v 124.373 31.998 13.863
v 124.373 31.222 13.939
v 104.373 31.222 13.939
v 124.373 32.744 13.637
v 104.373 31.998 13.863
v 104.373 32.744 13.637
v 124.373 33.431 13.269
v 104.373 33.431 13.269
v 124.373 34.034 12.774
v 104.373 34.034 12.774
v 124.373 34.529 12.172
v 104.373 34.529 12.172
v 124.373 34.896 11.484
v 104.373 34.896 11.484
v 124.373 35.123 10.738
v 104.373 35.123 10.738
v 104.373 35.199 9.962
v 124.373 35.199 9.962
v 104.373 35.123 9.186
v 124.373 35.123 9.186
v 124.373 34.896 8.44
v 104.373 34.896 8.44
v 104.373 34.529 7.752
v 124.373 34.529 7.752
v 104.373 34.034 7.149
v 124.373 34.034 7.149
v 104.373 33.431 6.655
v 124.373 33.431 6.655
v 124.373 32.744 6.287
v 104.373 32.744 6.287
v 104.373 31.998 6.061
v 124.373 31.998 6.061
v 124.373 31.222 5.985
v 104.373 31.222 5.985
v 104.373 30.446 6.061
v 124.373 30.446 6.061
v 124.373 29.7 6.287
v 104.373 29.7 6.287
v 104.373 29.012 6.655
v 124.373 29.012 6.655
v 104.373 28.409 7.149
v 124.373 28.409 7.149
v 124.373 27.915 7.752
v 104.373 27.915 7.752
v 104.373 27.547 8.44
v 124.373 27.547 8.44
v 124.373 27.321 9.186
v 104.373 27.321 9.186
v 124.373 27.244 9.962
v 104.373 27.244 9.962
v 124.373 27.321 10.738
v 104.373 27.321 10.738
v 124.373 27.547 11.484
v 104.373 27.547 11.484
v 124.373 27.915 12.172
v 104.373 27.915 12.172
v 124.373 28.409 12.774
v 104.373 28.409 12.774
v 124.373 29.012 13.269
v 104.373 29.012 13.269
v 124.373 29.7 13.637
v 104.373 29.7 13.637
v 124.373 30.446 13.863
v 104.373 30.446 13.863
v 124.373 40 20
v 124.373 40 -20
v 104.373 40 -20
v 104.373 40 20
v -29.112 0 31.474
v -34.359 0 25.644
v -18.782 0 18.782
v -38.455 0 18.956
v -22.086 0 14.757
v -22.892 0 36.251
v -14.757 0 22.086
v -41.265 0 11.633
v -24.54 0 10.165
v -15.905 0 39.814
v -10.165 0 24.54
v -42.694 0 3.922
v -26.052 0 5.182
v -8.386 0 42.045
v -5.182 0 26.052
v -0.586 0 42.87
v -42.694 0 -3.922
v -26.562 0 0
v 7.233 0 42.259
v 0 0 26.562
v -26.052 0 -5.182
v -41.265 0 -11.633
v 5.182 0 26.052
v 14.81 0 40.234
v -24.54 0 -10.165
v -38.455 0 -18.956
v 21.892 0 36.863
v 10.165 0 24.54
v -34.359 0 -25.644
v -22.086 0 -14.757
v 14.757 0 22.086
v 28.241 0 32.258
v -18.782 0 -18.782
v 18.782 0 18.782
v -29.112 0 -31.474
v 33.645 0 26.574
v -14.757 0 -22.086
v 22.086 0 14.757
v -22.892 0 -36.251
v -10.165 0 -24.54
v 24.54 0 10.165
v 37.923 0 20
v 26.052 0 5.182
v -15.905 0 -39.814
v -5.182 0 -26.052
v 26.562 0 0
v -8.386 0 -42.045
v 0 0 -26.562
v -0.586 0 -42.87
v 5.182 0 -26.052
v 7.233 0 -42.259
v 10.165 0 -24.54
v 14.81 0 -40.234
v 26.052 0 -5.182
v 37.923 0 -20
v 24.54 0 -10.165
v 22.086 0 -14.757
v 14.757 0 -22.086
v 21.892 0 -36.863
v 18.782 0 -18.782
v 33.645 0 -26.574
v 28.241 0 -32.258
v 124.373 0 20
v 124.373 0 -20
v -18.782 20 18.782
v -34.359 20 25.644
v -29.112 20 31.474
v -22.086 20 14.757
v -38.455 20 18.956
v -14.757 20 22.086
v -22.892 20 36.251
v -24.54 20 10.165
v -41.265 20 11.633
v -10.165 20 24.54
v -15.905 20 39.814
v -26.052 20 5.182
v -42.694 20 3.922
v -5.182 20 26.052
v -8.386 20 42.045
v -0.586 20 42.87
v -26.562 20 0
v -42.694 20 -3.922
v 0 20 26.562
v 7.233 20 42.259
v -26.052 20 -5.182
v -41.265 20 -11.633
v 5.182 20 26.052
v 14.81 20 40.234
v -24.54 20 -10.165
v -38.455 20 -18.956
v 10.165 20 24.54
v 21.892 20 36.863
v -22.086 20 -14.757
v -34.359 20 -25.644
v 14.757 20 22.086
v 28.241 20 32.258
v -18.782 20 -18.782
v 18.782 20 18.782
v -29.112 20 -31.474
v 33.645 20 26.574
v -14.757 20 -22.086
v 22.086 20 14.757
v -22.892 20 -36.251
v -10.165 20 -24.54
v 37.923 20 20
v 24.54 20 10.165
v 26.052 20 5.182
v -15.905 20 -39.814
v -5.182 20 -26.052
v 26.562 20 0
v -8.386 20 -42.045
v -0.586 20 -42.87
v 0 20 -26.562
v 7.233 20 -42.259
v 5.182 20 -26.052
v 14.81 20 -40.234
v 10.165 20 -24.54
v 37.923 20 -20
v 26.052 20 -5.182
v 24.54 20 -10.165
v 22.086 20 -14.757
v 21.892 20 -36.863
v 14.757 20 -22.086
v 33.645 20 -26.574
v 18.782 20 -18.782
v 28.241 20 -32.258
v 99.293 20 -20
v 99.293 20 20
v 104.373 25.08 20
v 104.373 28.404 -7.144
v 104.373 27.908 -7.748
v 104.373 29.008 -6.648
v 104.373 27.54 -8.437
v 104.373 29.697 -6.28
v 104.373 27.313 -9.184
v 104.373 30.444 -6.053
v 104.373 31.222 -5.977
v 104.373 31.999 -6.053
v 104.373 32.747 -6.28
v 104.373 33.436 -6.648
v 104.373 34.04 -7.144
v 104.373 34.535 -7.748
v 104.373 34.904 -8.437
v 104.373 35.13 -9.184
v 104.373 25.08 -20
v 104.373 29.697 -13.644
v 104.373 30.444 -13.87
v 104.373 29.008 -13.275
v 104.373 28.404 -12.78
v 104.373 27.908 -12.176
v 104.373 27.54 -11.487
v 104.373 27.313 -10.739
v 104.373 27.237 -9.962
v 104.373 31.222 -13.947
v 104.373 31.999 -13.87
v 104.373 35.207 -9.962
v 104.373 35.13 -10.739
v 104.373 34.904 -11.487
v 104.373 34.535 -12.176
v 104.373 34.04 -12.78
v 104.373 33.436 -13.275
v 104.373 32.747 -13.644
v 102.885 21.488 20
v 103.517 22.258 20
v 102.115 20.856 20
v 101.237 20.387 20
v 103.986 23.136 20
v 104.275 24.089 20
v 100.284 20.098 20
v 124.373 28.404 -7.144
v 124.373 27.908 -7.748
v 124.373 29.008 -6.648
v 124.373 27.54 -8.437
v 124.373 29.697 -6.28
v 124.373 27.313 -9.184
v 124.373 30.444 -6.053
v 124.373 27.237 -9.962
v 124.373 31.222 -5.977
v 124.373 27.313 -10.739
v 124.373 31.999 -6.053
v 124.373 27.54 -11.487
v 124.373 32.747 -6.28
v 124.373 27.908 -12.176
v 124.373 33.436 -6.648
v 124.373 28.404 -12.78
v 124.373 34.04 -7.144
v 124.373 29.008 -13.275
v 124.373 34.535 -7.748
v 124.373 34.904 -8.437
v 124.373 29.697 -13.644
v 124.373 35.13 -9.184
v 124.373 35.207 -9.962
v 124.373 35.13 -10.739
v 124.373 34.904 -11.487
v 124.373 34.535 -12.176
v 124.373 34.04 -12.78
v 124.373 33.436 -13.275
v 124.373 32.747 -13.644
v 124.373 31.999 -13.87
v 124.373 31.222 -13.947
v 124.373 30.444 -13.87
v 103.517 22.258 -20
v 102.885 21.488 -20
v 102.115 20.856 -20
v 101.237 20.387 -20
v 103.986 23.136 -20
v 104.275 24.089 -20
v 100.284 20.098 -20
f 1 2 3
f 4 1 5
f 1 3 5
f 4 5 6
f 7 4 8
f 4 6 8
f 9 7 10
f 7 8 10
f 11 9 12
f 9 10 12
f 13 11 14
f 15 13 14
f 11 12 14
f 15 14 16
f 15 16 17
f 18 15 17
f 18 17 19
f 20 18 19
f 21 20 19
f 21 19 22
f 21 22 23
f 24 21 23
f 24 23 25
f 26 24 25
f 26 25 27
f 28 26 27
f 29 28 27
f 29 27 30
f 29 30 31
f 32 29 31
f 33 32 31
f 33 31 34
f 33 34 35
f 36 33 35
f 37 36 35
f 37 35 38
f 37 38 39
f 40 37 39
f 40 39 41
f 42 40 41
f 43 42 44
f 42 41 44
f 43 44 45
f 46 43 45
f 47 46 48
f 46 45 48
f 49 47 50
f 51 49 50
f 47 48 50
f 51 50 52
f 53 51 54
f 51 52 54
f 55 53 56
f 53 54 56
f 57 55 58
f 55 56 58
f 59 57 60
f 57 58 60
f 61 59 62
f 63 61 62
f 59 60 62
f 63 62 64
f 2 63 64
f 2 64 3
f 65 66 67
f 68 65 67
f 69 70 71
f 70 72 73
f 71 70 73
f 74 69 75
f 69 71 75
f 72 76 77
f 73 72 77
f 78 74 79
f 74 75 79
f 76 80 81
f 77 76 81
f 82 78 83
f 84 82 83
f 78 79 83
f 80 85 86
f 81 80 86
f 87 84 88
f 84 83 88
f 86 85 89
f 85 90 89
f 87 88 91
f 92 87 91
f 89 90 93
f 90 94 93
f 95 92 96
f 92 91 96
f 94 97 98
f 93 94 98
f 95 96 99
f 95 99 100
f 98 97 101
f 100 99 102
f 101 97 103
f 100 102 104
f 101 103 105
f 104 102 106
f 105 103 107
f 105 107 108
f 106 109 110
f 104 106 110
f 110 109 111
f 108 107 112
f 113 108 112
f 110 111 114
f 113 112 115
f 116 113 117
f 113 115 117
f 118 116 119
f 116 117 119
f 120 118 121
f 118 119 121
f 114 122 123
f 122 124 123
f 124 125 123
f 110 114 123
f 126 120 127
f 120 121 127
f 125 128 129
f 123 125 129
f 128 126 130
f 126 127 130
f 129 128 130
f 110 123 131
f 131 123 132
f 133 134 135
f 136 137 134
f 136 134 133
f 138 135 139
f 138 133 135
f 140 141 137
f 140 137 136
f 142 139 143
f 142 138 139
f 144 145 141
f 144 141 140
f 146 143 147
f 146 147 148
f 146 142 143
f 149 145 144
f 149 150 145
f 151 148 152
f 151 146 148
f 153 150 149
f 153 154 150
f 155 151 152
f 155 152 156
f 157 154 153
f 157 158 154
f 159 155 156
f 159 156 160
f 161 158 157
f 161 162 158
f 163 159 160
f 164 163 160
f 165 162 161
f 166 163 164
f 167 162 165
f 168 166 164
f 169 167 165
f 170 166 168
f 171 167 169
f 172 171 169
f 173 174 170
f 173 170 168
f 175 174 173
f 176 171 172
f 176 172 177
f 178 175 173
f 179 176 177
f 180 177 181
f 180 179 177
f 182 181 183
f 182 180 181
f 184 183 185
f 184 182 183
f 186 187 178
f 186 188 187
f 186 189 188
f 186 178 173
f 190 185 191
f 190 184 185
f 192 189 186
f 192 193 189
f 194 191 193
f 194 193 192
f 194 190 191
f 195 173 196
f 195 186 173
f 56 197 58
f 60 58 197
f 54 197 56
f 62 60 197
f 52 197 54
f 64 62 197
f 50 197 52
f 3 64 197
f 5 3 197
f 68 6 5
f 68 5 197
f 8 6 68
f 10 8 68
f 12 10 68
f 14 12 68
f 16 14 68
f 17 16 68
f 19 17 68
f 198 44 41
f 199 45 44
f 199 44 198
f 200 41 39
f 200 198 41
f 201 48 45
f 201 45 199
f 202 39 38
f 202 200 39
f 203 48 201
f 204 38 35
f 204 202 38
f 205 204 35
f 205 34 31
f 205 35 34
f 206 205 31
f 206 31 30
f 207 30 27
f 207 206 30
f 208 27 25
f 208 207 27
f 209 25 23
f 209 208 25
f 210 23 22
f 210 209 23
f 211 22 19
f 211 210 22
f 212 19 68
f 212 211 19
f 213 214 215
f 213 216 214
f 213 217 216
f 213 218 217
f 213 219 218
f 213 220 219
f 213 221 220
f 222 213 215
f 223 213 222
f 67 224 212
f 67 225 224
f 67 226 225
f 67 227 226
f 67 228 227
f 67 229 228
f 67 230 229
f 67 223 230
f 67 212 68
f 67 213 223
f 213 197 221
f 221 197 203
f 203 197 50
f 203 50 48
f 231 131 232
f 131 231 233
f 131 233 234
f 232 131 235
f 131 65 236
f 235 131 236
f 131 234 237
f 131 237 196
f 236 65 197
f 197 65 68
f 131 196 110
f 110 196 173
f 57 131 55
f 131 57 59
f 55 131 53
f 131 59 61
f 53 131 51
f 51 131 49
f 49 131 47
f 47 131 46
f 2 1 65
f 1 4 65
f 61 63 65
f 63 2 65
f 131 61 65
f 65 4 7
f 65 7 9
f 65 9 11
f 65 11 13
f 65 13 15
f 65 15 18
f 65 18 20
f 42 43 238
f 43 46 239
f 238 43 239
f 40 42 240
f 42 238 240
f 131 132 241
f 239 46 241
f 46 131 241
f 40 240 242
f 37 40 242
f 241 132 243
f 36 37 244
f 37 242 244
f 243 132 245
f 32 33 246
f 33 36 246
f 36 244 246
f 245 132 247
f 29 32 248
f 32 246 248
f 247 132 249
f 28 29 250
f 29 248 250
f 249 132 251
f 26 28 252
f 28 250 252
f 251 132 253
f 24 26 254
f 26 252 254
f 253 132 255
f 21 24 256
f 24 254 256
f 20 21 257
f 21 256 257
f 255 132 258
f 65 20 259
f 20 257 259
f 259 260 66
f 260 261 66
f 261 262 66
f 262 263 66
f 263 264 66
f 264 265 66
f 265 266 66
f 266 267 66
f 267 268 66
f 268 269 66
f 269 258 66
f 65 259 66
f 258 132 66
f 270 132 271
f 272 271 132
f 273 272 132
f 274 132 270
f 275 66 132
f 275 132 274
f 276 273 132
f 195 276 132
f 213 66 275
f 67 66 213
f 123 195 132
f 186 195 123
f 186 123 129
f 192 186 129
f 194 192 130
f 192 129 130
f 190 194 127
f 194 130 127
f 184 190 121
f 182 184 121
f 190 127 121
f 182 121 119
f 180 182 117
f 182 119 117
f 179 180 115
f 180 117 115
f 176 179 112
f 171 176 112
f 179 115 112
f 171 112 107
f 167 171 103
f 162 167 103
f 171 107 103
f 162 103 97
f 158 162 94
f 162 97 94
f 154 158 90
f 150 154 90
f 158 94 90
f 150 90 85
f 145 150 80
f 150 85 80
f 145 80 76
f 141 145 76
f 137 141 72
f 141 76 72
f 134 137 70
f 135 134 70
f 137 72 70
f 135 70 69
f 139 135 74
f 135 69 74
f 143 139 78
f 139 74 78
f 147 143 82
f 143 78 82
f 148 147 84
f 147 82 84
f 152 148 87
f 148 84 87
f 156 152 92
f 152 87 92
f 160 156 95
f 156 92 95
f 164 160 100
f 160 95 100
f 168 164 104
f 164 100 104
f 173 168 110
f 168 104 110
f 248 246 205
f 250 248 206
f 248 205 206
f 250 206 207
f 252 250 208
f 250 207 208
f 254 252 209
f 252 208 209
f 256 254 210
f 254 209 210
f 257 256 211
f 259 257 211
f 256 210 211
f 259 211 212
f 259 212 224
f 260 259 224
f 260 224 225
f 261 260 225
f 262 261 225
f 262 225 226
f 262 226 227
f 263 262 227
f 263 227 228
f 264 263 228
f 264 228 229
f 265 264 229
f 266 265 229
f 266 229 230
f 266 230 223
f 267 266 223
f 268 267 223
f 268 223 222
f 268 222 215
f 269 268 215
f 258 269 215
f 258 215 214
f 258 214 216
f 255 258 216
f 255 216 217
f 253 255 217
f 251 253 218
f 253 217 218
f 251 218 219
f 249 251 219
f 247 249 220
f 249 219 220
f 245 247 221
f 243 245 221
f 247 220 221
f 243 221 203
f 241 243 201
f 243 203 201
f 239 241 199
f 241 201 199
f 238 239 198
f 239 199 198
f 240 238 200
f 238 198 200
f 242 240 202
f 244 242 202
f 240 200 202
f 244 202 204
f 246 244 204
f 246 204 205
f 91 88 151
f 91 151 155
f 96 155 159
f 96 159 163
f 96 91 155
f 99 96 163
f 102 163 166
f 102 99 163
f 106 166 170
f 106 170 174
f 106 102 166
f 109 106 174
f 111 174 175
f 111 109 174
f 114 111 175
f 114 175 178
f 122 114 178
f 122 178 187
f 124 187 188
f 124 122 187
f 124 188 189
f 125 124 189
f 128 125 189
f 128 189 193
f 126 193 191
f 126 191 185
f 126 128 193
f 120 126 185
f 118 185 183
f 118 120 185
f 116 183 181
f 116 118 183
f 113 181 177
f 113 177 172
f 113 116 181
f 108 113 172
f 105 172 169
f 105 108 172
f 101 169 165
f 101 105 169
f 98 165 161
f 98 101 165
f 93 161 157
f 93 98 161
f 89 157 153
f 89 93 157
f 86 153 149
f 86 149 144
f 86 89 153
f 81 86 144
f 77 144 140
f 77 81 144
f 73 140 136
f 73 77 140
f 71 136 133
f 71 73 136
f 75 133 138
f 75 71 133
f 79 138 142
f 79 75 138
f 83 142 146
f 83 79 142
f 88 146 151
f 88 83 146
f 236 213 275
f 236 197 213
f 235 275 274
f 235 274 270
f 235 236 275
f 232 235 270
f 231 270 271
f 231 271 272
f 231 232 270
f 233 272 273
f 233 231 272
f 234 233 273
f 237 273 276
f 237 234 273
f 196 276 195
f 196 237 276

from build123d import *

# Parameters (mm, degrees)
SKETCH1_R           = 26.56205
BOSS_EXTRUDE2_DEPTH = 20
SKETCH2_W           = 20
SKETCH2_H           = 20
BOSS_EXTRUDE3_DEPTH = 40
SKETCH3_R           = 3.9773733
SKETCH3_R_2         = 3.985133
CUT_EXTRUDE1_DEPTH  = 159.491729693
FILLET1_R           = 5.08


with BuildPart() as part:
    # Sketch1 → Boss-Extrude2 (new body)
    # profile 1 of 3: a face of its own
    with BuildSketch(Plane(origin=(0, 0, 0), x_dir=(1, 0, 0), z_dir=(0, 1, 0))):
        with BuildLine():
            Line((37.922816996, -20), (37.922816996, 20))
            ThreePointArc((37.922816996, 20), (-42.873535531, 0), (37.922816996, -20))
        make_face()
        with Locations(Location((0, 0, 0), (0, 0, 270))):
            Circle(SKETCH1_R, mode=Mode.SUBTRACT)
    # profile 2 of 3: a face of its own
    with BuildSketch(Plane(origin=(0, 0, 0), x_dir=(1, 0, 0), z_dir=(0, 1, 0))):
        with BuildLine():
            Line((124.372816996, 20), (37.922816996, 20))
            ThreePointArc((37.922816996, 20), (41.617456018, 10.301815544), (42.873535531, 0))
            ThreePointArc((42.873535531, 0), (41.617456018, -10.301815544), (37.922816996, -20))
            Line((37.922816996, -20), (124.372816996, -20))
            Line((124.372816996, -20), (124.372816996, 20))
        make_face()
    # profile 3 of 3: a face of its own
    with BuildSketch(Plane(origin=(0, 0, 0), x_dir=(1, 0, 0), z_dir=(0, 1, 0))):
        with BuildLine():
            ThreePointArc((42.873535531, 0), (41.617456018, 10.301815544), (37.922816996, 20))
            Line((37.922816996, 20), (37.922816996, -20))
            ThreePointArc((37.922816996, -20), (41.617456018, -10.301815544), (42.873535531, 0))
        make_face()
    extrude(amount=BOSS_EXTRUDE2_DEPTH)

    # Sketch2 → Boss-Extrude3 (add)
    with BuildSketch(Plane(origin=(0, 0, -20), x_dir=(-1, 0, 0), z_dir=(0, 0, -1))):
        with Locations((-114.372816996, 30)):
            Rectangle(SKETCH2_W, SKETCH2_H)
    extrude(amount=-BOSS_EXTRUDE3_DEPTH)

    # Sketch3 → Cut-Extrude1 (cut, through all)
    with BuildSketch(Plane.ZY.offset(-104.372816996)):
        with Locations((9.96192, 31.22176)):
            Circle(SKETCH3_R)
        with Locations((-9.96192, 31.22176)):
            Circle(SKETCH3_R_2)
    extrude(amount=-CUT_EXTRUDE1_DEPTH, mode=Mode.SUBTRACT)

    # Fillet1
    fillet1_edges = [part.edges().sort_by_distance(p)[0] for p in [
        (104.372816996, 20, 0),
    ]]
    fillet(fillet1_edges, radius=FILLET1_R)


solid = part.part
